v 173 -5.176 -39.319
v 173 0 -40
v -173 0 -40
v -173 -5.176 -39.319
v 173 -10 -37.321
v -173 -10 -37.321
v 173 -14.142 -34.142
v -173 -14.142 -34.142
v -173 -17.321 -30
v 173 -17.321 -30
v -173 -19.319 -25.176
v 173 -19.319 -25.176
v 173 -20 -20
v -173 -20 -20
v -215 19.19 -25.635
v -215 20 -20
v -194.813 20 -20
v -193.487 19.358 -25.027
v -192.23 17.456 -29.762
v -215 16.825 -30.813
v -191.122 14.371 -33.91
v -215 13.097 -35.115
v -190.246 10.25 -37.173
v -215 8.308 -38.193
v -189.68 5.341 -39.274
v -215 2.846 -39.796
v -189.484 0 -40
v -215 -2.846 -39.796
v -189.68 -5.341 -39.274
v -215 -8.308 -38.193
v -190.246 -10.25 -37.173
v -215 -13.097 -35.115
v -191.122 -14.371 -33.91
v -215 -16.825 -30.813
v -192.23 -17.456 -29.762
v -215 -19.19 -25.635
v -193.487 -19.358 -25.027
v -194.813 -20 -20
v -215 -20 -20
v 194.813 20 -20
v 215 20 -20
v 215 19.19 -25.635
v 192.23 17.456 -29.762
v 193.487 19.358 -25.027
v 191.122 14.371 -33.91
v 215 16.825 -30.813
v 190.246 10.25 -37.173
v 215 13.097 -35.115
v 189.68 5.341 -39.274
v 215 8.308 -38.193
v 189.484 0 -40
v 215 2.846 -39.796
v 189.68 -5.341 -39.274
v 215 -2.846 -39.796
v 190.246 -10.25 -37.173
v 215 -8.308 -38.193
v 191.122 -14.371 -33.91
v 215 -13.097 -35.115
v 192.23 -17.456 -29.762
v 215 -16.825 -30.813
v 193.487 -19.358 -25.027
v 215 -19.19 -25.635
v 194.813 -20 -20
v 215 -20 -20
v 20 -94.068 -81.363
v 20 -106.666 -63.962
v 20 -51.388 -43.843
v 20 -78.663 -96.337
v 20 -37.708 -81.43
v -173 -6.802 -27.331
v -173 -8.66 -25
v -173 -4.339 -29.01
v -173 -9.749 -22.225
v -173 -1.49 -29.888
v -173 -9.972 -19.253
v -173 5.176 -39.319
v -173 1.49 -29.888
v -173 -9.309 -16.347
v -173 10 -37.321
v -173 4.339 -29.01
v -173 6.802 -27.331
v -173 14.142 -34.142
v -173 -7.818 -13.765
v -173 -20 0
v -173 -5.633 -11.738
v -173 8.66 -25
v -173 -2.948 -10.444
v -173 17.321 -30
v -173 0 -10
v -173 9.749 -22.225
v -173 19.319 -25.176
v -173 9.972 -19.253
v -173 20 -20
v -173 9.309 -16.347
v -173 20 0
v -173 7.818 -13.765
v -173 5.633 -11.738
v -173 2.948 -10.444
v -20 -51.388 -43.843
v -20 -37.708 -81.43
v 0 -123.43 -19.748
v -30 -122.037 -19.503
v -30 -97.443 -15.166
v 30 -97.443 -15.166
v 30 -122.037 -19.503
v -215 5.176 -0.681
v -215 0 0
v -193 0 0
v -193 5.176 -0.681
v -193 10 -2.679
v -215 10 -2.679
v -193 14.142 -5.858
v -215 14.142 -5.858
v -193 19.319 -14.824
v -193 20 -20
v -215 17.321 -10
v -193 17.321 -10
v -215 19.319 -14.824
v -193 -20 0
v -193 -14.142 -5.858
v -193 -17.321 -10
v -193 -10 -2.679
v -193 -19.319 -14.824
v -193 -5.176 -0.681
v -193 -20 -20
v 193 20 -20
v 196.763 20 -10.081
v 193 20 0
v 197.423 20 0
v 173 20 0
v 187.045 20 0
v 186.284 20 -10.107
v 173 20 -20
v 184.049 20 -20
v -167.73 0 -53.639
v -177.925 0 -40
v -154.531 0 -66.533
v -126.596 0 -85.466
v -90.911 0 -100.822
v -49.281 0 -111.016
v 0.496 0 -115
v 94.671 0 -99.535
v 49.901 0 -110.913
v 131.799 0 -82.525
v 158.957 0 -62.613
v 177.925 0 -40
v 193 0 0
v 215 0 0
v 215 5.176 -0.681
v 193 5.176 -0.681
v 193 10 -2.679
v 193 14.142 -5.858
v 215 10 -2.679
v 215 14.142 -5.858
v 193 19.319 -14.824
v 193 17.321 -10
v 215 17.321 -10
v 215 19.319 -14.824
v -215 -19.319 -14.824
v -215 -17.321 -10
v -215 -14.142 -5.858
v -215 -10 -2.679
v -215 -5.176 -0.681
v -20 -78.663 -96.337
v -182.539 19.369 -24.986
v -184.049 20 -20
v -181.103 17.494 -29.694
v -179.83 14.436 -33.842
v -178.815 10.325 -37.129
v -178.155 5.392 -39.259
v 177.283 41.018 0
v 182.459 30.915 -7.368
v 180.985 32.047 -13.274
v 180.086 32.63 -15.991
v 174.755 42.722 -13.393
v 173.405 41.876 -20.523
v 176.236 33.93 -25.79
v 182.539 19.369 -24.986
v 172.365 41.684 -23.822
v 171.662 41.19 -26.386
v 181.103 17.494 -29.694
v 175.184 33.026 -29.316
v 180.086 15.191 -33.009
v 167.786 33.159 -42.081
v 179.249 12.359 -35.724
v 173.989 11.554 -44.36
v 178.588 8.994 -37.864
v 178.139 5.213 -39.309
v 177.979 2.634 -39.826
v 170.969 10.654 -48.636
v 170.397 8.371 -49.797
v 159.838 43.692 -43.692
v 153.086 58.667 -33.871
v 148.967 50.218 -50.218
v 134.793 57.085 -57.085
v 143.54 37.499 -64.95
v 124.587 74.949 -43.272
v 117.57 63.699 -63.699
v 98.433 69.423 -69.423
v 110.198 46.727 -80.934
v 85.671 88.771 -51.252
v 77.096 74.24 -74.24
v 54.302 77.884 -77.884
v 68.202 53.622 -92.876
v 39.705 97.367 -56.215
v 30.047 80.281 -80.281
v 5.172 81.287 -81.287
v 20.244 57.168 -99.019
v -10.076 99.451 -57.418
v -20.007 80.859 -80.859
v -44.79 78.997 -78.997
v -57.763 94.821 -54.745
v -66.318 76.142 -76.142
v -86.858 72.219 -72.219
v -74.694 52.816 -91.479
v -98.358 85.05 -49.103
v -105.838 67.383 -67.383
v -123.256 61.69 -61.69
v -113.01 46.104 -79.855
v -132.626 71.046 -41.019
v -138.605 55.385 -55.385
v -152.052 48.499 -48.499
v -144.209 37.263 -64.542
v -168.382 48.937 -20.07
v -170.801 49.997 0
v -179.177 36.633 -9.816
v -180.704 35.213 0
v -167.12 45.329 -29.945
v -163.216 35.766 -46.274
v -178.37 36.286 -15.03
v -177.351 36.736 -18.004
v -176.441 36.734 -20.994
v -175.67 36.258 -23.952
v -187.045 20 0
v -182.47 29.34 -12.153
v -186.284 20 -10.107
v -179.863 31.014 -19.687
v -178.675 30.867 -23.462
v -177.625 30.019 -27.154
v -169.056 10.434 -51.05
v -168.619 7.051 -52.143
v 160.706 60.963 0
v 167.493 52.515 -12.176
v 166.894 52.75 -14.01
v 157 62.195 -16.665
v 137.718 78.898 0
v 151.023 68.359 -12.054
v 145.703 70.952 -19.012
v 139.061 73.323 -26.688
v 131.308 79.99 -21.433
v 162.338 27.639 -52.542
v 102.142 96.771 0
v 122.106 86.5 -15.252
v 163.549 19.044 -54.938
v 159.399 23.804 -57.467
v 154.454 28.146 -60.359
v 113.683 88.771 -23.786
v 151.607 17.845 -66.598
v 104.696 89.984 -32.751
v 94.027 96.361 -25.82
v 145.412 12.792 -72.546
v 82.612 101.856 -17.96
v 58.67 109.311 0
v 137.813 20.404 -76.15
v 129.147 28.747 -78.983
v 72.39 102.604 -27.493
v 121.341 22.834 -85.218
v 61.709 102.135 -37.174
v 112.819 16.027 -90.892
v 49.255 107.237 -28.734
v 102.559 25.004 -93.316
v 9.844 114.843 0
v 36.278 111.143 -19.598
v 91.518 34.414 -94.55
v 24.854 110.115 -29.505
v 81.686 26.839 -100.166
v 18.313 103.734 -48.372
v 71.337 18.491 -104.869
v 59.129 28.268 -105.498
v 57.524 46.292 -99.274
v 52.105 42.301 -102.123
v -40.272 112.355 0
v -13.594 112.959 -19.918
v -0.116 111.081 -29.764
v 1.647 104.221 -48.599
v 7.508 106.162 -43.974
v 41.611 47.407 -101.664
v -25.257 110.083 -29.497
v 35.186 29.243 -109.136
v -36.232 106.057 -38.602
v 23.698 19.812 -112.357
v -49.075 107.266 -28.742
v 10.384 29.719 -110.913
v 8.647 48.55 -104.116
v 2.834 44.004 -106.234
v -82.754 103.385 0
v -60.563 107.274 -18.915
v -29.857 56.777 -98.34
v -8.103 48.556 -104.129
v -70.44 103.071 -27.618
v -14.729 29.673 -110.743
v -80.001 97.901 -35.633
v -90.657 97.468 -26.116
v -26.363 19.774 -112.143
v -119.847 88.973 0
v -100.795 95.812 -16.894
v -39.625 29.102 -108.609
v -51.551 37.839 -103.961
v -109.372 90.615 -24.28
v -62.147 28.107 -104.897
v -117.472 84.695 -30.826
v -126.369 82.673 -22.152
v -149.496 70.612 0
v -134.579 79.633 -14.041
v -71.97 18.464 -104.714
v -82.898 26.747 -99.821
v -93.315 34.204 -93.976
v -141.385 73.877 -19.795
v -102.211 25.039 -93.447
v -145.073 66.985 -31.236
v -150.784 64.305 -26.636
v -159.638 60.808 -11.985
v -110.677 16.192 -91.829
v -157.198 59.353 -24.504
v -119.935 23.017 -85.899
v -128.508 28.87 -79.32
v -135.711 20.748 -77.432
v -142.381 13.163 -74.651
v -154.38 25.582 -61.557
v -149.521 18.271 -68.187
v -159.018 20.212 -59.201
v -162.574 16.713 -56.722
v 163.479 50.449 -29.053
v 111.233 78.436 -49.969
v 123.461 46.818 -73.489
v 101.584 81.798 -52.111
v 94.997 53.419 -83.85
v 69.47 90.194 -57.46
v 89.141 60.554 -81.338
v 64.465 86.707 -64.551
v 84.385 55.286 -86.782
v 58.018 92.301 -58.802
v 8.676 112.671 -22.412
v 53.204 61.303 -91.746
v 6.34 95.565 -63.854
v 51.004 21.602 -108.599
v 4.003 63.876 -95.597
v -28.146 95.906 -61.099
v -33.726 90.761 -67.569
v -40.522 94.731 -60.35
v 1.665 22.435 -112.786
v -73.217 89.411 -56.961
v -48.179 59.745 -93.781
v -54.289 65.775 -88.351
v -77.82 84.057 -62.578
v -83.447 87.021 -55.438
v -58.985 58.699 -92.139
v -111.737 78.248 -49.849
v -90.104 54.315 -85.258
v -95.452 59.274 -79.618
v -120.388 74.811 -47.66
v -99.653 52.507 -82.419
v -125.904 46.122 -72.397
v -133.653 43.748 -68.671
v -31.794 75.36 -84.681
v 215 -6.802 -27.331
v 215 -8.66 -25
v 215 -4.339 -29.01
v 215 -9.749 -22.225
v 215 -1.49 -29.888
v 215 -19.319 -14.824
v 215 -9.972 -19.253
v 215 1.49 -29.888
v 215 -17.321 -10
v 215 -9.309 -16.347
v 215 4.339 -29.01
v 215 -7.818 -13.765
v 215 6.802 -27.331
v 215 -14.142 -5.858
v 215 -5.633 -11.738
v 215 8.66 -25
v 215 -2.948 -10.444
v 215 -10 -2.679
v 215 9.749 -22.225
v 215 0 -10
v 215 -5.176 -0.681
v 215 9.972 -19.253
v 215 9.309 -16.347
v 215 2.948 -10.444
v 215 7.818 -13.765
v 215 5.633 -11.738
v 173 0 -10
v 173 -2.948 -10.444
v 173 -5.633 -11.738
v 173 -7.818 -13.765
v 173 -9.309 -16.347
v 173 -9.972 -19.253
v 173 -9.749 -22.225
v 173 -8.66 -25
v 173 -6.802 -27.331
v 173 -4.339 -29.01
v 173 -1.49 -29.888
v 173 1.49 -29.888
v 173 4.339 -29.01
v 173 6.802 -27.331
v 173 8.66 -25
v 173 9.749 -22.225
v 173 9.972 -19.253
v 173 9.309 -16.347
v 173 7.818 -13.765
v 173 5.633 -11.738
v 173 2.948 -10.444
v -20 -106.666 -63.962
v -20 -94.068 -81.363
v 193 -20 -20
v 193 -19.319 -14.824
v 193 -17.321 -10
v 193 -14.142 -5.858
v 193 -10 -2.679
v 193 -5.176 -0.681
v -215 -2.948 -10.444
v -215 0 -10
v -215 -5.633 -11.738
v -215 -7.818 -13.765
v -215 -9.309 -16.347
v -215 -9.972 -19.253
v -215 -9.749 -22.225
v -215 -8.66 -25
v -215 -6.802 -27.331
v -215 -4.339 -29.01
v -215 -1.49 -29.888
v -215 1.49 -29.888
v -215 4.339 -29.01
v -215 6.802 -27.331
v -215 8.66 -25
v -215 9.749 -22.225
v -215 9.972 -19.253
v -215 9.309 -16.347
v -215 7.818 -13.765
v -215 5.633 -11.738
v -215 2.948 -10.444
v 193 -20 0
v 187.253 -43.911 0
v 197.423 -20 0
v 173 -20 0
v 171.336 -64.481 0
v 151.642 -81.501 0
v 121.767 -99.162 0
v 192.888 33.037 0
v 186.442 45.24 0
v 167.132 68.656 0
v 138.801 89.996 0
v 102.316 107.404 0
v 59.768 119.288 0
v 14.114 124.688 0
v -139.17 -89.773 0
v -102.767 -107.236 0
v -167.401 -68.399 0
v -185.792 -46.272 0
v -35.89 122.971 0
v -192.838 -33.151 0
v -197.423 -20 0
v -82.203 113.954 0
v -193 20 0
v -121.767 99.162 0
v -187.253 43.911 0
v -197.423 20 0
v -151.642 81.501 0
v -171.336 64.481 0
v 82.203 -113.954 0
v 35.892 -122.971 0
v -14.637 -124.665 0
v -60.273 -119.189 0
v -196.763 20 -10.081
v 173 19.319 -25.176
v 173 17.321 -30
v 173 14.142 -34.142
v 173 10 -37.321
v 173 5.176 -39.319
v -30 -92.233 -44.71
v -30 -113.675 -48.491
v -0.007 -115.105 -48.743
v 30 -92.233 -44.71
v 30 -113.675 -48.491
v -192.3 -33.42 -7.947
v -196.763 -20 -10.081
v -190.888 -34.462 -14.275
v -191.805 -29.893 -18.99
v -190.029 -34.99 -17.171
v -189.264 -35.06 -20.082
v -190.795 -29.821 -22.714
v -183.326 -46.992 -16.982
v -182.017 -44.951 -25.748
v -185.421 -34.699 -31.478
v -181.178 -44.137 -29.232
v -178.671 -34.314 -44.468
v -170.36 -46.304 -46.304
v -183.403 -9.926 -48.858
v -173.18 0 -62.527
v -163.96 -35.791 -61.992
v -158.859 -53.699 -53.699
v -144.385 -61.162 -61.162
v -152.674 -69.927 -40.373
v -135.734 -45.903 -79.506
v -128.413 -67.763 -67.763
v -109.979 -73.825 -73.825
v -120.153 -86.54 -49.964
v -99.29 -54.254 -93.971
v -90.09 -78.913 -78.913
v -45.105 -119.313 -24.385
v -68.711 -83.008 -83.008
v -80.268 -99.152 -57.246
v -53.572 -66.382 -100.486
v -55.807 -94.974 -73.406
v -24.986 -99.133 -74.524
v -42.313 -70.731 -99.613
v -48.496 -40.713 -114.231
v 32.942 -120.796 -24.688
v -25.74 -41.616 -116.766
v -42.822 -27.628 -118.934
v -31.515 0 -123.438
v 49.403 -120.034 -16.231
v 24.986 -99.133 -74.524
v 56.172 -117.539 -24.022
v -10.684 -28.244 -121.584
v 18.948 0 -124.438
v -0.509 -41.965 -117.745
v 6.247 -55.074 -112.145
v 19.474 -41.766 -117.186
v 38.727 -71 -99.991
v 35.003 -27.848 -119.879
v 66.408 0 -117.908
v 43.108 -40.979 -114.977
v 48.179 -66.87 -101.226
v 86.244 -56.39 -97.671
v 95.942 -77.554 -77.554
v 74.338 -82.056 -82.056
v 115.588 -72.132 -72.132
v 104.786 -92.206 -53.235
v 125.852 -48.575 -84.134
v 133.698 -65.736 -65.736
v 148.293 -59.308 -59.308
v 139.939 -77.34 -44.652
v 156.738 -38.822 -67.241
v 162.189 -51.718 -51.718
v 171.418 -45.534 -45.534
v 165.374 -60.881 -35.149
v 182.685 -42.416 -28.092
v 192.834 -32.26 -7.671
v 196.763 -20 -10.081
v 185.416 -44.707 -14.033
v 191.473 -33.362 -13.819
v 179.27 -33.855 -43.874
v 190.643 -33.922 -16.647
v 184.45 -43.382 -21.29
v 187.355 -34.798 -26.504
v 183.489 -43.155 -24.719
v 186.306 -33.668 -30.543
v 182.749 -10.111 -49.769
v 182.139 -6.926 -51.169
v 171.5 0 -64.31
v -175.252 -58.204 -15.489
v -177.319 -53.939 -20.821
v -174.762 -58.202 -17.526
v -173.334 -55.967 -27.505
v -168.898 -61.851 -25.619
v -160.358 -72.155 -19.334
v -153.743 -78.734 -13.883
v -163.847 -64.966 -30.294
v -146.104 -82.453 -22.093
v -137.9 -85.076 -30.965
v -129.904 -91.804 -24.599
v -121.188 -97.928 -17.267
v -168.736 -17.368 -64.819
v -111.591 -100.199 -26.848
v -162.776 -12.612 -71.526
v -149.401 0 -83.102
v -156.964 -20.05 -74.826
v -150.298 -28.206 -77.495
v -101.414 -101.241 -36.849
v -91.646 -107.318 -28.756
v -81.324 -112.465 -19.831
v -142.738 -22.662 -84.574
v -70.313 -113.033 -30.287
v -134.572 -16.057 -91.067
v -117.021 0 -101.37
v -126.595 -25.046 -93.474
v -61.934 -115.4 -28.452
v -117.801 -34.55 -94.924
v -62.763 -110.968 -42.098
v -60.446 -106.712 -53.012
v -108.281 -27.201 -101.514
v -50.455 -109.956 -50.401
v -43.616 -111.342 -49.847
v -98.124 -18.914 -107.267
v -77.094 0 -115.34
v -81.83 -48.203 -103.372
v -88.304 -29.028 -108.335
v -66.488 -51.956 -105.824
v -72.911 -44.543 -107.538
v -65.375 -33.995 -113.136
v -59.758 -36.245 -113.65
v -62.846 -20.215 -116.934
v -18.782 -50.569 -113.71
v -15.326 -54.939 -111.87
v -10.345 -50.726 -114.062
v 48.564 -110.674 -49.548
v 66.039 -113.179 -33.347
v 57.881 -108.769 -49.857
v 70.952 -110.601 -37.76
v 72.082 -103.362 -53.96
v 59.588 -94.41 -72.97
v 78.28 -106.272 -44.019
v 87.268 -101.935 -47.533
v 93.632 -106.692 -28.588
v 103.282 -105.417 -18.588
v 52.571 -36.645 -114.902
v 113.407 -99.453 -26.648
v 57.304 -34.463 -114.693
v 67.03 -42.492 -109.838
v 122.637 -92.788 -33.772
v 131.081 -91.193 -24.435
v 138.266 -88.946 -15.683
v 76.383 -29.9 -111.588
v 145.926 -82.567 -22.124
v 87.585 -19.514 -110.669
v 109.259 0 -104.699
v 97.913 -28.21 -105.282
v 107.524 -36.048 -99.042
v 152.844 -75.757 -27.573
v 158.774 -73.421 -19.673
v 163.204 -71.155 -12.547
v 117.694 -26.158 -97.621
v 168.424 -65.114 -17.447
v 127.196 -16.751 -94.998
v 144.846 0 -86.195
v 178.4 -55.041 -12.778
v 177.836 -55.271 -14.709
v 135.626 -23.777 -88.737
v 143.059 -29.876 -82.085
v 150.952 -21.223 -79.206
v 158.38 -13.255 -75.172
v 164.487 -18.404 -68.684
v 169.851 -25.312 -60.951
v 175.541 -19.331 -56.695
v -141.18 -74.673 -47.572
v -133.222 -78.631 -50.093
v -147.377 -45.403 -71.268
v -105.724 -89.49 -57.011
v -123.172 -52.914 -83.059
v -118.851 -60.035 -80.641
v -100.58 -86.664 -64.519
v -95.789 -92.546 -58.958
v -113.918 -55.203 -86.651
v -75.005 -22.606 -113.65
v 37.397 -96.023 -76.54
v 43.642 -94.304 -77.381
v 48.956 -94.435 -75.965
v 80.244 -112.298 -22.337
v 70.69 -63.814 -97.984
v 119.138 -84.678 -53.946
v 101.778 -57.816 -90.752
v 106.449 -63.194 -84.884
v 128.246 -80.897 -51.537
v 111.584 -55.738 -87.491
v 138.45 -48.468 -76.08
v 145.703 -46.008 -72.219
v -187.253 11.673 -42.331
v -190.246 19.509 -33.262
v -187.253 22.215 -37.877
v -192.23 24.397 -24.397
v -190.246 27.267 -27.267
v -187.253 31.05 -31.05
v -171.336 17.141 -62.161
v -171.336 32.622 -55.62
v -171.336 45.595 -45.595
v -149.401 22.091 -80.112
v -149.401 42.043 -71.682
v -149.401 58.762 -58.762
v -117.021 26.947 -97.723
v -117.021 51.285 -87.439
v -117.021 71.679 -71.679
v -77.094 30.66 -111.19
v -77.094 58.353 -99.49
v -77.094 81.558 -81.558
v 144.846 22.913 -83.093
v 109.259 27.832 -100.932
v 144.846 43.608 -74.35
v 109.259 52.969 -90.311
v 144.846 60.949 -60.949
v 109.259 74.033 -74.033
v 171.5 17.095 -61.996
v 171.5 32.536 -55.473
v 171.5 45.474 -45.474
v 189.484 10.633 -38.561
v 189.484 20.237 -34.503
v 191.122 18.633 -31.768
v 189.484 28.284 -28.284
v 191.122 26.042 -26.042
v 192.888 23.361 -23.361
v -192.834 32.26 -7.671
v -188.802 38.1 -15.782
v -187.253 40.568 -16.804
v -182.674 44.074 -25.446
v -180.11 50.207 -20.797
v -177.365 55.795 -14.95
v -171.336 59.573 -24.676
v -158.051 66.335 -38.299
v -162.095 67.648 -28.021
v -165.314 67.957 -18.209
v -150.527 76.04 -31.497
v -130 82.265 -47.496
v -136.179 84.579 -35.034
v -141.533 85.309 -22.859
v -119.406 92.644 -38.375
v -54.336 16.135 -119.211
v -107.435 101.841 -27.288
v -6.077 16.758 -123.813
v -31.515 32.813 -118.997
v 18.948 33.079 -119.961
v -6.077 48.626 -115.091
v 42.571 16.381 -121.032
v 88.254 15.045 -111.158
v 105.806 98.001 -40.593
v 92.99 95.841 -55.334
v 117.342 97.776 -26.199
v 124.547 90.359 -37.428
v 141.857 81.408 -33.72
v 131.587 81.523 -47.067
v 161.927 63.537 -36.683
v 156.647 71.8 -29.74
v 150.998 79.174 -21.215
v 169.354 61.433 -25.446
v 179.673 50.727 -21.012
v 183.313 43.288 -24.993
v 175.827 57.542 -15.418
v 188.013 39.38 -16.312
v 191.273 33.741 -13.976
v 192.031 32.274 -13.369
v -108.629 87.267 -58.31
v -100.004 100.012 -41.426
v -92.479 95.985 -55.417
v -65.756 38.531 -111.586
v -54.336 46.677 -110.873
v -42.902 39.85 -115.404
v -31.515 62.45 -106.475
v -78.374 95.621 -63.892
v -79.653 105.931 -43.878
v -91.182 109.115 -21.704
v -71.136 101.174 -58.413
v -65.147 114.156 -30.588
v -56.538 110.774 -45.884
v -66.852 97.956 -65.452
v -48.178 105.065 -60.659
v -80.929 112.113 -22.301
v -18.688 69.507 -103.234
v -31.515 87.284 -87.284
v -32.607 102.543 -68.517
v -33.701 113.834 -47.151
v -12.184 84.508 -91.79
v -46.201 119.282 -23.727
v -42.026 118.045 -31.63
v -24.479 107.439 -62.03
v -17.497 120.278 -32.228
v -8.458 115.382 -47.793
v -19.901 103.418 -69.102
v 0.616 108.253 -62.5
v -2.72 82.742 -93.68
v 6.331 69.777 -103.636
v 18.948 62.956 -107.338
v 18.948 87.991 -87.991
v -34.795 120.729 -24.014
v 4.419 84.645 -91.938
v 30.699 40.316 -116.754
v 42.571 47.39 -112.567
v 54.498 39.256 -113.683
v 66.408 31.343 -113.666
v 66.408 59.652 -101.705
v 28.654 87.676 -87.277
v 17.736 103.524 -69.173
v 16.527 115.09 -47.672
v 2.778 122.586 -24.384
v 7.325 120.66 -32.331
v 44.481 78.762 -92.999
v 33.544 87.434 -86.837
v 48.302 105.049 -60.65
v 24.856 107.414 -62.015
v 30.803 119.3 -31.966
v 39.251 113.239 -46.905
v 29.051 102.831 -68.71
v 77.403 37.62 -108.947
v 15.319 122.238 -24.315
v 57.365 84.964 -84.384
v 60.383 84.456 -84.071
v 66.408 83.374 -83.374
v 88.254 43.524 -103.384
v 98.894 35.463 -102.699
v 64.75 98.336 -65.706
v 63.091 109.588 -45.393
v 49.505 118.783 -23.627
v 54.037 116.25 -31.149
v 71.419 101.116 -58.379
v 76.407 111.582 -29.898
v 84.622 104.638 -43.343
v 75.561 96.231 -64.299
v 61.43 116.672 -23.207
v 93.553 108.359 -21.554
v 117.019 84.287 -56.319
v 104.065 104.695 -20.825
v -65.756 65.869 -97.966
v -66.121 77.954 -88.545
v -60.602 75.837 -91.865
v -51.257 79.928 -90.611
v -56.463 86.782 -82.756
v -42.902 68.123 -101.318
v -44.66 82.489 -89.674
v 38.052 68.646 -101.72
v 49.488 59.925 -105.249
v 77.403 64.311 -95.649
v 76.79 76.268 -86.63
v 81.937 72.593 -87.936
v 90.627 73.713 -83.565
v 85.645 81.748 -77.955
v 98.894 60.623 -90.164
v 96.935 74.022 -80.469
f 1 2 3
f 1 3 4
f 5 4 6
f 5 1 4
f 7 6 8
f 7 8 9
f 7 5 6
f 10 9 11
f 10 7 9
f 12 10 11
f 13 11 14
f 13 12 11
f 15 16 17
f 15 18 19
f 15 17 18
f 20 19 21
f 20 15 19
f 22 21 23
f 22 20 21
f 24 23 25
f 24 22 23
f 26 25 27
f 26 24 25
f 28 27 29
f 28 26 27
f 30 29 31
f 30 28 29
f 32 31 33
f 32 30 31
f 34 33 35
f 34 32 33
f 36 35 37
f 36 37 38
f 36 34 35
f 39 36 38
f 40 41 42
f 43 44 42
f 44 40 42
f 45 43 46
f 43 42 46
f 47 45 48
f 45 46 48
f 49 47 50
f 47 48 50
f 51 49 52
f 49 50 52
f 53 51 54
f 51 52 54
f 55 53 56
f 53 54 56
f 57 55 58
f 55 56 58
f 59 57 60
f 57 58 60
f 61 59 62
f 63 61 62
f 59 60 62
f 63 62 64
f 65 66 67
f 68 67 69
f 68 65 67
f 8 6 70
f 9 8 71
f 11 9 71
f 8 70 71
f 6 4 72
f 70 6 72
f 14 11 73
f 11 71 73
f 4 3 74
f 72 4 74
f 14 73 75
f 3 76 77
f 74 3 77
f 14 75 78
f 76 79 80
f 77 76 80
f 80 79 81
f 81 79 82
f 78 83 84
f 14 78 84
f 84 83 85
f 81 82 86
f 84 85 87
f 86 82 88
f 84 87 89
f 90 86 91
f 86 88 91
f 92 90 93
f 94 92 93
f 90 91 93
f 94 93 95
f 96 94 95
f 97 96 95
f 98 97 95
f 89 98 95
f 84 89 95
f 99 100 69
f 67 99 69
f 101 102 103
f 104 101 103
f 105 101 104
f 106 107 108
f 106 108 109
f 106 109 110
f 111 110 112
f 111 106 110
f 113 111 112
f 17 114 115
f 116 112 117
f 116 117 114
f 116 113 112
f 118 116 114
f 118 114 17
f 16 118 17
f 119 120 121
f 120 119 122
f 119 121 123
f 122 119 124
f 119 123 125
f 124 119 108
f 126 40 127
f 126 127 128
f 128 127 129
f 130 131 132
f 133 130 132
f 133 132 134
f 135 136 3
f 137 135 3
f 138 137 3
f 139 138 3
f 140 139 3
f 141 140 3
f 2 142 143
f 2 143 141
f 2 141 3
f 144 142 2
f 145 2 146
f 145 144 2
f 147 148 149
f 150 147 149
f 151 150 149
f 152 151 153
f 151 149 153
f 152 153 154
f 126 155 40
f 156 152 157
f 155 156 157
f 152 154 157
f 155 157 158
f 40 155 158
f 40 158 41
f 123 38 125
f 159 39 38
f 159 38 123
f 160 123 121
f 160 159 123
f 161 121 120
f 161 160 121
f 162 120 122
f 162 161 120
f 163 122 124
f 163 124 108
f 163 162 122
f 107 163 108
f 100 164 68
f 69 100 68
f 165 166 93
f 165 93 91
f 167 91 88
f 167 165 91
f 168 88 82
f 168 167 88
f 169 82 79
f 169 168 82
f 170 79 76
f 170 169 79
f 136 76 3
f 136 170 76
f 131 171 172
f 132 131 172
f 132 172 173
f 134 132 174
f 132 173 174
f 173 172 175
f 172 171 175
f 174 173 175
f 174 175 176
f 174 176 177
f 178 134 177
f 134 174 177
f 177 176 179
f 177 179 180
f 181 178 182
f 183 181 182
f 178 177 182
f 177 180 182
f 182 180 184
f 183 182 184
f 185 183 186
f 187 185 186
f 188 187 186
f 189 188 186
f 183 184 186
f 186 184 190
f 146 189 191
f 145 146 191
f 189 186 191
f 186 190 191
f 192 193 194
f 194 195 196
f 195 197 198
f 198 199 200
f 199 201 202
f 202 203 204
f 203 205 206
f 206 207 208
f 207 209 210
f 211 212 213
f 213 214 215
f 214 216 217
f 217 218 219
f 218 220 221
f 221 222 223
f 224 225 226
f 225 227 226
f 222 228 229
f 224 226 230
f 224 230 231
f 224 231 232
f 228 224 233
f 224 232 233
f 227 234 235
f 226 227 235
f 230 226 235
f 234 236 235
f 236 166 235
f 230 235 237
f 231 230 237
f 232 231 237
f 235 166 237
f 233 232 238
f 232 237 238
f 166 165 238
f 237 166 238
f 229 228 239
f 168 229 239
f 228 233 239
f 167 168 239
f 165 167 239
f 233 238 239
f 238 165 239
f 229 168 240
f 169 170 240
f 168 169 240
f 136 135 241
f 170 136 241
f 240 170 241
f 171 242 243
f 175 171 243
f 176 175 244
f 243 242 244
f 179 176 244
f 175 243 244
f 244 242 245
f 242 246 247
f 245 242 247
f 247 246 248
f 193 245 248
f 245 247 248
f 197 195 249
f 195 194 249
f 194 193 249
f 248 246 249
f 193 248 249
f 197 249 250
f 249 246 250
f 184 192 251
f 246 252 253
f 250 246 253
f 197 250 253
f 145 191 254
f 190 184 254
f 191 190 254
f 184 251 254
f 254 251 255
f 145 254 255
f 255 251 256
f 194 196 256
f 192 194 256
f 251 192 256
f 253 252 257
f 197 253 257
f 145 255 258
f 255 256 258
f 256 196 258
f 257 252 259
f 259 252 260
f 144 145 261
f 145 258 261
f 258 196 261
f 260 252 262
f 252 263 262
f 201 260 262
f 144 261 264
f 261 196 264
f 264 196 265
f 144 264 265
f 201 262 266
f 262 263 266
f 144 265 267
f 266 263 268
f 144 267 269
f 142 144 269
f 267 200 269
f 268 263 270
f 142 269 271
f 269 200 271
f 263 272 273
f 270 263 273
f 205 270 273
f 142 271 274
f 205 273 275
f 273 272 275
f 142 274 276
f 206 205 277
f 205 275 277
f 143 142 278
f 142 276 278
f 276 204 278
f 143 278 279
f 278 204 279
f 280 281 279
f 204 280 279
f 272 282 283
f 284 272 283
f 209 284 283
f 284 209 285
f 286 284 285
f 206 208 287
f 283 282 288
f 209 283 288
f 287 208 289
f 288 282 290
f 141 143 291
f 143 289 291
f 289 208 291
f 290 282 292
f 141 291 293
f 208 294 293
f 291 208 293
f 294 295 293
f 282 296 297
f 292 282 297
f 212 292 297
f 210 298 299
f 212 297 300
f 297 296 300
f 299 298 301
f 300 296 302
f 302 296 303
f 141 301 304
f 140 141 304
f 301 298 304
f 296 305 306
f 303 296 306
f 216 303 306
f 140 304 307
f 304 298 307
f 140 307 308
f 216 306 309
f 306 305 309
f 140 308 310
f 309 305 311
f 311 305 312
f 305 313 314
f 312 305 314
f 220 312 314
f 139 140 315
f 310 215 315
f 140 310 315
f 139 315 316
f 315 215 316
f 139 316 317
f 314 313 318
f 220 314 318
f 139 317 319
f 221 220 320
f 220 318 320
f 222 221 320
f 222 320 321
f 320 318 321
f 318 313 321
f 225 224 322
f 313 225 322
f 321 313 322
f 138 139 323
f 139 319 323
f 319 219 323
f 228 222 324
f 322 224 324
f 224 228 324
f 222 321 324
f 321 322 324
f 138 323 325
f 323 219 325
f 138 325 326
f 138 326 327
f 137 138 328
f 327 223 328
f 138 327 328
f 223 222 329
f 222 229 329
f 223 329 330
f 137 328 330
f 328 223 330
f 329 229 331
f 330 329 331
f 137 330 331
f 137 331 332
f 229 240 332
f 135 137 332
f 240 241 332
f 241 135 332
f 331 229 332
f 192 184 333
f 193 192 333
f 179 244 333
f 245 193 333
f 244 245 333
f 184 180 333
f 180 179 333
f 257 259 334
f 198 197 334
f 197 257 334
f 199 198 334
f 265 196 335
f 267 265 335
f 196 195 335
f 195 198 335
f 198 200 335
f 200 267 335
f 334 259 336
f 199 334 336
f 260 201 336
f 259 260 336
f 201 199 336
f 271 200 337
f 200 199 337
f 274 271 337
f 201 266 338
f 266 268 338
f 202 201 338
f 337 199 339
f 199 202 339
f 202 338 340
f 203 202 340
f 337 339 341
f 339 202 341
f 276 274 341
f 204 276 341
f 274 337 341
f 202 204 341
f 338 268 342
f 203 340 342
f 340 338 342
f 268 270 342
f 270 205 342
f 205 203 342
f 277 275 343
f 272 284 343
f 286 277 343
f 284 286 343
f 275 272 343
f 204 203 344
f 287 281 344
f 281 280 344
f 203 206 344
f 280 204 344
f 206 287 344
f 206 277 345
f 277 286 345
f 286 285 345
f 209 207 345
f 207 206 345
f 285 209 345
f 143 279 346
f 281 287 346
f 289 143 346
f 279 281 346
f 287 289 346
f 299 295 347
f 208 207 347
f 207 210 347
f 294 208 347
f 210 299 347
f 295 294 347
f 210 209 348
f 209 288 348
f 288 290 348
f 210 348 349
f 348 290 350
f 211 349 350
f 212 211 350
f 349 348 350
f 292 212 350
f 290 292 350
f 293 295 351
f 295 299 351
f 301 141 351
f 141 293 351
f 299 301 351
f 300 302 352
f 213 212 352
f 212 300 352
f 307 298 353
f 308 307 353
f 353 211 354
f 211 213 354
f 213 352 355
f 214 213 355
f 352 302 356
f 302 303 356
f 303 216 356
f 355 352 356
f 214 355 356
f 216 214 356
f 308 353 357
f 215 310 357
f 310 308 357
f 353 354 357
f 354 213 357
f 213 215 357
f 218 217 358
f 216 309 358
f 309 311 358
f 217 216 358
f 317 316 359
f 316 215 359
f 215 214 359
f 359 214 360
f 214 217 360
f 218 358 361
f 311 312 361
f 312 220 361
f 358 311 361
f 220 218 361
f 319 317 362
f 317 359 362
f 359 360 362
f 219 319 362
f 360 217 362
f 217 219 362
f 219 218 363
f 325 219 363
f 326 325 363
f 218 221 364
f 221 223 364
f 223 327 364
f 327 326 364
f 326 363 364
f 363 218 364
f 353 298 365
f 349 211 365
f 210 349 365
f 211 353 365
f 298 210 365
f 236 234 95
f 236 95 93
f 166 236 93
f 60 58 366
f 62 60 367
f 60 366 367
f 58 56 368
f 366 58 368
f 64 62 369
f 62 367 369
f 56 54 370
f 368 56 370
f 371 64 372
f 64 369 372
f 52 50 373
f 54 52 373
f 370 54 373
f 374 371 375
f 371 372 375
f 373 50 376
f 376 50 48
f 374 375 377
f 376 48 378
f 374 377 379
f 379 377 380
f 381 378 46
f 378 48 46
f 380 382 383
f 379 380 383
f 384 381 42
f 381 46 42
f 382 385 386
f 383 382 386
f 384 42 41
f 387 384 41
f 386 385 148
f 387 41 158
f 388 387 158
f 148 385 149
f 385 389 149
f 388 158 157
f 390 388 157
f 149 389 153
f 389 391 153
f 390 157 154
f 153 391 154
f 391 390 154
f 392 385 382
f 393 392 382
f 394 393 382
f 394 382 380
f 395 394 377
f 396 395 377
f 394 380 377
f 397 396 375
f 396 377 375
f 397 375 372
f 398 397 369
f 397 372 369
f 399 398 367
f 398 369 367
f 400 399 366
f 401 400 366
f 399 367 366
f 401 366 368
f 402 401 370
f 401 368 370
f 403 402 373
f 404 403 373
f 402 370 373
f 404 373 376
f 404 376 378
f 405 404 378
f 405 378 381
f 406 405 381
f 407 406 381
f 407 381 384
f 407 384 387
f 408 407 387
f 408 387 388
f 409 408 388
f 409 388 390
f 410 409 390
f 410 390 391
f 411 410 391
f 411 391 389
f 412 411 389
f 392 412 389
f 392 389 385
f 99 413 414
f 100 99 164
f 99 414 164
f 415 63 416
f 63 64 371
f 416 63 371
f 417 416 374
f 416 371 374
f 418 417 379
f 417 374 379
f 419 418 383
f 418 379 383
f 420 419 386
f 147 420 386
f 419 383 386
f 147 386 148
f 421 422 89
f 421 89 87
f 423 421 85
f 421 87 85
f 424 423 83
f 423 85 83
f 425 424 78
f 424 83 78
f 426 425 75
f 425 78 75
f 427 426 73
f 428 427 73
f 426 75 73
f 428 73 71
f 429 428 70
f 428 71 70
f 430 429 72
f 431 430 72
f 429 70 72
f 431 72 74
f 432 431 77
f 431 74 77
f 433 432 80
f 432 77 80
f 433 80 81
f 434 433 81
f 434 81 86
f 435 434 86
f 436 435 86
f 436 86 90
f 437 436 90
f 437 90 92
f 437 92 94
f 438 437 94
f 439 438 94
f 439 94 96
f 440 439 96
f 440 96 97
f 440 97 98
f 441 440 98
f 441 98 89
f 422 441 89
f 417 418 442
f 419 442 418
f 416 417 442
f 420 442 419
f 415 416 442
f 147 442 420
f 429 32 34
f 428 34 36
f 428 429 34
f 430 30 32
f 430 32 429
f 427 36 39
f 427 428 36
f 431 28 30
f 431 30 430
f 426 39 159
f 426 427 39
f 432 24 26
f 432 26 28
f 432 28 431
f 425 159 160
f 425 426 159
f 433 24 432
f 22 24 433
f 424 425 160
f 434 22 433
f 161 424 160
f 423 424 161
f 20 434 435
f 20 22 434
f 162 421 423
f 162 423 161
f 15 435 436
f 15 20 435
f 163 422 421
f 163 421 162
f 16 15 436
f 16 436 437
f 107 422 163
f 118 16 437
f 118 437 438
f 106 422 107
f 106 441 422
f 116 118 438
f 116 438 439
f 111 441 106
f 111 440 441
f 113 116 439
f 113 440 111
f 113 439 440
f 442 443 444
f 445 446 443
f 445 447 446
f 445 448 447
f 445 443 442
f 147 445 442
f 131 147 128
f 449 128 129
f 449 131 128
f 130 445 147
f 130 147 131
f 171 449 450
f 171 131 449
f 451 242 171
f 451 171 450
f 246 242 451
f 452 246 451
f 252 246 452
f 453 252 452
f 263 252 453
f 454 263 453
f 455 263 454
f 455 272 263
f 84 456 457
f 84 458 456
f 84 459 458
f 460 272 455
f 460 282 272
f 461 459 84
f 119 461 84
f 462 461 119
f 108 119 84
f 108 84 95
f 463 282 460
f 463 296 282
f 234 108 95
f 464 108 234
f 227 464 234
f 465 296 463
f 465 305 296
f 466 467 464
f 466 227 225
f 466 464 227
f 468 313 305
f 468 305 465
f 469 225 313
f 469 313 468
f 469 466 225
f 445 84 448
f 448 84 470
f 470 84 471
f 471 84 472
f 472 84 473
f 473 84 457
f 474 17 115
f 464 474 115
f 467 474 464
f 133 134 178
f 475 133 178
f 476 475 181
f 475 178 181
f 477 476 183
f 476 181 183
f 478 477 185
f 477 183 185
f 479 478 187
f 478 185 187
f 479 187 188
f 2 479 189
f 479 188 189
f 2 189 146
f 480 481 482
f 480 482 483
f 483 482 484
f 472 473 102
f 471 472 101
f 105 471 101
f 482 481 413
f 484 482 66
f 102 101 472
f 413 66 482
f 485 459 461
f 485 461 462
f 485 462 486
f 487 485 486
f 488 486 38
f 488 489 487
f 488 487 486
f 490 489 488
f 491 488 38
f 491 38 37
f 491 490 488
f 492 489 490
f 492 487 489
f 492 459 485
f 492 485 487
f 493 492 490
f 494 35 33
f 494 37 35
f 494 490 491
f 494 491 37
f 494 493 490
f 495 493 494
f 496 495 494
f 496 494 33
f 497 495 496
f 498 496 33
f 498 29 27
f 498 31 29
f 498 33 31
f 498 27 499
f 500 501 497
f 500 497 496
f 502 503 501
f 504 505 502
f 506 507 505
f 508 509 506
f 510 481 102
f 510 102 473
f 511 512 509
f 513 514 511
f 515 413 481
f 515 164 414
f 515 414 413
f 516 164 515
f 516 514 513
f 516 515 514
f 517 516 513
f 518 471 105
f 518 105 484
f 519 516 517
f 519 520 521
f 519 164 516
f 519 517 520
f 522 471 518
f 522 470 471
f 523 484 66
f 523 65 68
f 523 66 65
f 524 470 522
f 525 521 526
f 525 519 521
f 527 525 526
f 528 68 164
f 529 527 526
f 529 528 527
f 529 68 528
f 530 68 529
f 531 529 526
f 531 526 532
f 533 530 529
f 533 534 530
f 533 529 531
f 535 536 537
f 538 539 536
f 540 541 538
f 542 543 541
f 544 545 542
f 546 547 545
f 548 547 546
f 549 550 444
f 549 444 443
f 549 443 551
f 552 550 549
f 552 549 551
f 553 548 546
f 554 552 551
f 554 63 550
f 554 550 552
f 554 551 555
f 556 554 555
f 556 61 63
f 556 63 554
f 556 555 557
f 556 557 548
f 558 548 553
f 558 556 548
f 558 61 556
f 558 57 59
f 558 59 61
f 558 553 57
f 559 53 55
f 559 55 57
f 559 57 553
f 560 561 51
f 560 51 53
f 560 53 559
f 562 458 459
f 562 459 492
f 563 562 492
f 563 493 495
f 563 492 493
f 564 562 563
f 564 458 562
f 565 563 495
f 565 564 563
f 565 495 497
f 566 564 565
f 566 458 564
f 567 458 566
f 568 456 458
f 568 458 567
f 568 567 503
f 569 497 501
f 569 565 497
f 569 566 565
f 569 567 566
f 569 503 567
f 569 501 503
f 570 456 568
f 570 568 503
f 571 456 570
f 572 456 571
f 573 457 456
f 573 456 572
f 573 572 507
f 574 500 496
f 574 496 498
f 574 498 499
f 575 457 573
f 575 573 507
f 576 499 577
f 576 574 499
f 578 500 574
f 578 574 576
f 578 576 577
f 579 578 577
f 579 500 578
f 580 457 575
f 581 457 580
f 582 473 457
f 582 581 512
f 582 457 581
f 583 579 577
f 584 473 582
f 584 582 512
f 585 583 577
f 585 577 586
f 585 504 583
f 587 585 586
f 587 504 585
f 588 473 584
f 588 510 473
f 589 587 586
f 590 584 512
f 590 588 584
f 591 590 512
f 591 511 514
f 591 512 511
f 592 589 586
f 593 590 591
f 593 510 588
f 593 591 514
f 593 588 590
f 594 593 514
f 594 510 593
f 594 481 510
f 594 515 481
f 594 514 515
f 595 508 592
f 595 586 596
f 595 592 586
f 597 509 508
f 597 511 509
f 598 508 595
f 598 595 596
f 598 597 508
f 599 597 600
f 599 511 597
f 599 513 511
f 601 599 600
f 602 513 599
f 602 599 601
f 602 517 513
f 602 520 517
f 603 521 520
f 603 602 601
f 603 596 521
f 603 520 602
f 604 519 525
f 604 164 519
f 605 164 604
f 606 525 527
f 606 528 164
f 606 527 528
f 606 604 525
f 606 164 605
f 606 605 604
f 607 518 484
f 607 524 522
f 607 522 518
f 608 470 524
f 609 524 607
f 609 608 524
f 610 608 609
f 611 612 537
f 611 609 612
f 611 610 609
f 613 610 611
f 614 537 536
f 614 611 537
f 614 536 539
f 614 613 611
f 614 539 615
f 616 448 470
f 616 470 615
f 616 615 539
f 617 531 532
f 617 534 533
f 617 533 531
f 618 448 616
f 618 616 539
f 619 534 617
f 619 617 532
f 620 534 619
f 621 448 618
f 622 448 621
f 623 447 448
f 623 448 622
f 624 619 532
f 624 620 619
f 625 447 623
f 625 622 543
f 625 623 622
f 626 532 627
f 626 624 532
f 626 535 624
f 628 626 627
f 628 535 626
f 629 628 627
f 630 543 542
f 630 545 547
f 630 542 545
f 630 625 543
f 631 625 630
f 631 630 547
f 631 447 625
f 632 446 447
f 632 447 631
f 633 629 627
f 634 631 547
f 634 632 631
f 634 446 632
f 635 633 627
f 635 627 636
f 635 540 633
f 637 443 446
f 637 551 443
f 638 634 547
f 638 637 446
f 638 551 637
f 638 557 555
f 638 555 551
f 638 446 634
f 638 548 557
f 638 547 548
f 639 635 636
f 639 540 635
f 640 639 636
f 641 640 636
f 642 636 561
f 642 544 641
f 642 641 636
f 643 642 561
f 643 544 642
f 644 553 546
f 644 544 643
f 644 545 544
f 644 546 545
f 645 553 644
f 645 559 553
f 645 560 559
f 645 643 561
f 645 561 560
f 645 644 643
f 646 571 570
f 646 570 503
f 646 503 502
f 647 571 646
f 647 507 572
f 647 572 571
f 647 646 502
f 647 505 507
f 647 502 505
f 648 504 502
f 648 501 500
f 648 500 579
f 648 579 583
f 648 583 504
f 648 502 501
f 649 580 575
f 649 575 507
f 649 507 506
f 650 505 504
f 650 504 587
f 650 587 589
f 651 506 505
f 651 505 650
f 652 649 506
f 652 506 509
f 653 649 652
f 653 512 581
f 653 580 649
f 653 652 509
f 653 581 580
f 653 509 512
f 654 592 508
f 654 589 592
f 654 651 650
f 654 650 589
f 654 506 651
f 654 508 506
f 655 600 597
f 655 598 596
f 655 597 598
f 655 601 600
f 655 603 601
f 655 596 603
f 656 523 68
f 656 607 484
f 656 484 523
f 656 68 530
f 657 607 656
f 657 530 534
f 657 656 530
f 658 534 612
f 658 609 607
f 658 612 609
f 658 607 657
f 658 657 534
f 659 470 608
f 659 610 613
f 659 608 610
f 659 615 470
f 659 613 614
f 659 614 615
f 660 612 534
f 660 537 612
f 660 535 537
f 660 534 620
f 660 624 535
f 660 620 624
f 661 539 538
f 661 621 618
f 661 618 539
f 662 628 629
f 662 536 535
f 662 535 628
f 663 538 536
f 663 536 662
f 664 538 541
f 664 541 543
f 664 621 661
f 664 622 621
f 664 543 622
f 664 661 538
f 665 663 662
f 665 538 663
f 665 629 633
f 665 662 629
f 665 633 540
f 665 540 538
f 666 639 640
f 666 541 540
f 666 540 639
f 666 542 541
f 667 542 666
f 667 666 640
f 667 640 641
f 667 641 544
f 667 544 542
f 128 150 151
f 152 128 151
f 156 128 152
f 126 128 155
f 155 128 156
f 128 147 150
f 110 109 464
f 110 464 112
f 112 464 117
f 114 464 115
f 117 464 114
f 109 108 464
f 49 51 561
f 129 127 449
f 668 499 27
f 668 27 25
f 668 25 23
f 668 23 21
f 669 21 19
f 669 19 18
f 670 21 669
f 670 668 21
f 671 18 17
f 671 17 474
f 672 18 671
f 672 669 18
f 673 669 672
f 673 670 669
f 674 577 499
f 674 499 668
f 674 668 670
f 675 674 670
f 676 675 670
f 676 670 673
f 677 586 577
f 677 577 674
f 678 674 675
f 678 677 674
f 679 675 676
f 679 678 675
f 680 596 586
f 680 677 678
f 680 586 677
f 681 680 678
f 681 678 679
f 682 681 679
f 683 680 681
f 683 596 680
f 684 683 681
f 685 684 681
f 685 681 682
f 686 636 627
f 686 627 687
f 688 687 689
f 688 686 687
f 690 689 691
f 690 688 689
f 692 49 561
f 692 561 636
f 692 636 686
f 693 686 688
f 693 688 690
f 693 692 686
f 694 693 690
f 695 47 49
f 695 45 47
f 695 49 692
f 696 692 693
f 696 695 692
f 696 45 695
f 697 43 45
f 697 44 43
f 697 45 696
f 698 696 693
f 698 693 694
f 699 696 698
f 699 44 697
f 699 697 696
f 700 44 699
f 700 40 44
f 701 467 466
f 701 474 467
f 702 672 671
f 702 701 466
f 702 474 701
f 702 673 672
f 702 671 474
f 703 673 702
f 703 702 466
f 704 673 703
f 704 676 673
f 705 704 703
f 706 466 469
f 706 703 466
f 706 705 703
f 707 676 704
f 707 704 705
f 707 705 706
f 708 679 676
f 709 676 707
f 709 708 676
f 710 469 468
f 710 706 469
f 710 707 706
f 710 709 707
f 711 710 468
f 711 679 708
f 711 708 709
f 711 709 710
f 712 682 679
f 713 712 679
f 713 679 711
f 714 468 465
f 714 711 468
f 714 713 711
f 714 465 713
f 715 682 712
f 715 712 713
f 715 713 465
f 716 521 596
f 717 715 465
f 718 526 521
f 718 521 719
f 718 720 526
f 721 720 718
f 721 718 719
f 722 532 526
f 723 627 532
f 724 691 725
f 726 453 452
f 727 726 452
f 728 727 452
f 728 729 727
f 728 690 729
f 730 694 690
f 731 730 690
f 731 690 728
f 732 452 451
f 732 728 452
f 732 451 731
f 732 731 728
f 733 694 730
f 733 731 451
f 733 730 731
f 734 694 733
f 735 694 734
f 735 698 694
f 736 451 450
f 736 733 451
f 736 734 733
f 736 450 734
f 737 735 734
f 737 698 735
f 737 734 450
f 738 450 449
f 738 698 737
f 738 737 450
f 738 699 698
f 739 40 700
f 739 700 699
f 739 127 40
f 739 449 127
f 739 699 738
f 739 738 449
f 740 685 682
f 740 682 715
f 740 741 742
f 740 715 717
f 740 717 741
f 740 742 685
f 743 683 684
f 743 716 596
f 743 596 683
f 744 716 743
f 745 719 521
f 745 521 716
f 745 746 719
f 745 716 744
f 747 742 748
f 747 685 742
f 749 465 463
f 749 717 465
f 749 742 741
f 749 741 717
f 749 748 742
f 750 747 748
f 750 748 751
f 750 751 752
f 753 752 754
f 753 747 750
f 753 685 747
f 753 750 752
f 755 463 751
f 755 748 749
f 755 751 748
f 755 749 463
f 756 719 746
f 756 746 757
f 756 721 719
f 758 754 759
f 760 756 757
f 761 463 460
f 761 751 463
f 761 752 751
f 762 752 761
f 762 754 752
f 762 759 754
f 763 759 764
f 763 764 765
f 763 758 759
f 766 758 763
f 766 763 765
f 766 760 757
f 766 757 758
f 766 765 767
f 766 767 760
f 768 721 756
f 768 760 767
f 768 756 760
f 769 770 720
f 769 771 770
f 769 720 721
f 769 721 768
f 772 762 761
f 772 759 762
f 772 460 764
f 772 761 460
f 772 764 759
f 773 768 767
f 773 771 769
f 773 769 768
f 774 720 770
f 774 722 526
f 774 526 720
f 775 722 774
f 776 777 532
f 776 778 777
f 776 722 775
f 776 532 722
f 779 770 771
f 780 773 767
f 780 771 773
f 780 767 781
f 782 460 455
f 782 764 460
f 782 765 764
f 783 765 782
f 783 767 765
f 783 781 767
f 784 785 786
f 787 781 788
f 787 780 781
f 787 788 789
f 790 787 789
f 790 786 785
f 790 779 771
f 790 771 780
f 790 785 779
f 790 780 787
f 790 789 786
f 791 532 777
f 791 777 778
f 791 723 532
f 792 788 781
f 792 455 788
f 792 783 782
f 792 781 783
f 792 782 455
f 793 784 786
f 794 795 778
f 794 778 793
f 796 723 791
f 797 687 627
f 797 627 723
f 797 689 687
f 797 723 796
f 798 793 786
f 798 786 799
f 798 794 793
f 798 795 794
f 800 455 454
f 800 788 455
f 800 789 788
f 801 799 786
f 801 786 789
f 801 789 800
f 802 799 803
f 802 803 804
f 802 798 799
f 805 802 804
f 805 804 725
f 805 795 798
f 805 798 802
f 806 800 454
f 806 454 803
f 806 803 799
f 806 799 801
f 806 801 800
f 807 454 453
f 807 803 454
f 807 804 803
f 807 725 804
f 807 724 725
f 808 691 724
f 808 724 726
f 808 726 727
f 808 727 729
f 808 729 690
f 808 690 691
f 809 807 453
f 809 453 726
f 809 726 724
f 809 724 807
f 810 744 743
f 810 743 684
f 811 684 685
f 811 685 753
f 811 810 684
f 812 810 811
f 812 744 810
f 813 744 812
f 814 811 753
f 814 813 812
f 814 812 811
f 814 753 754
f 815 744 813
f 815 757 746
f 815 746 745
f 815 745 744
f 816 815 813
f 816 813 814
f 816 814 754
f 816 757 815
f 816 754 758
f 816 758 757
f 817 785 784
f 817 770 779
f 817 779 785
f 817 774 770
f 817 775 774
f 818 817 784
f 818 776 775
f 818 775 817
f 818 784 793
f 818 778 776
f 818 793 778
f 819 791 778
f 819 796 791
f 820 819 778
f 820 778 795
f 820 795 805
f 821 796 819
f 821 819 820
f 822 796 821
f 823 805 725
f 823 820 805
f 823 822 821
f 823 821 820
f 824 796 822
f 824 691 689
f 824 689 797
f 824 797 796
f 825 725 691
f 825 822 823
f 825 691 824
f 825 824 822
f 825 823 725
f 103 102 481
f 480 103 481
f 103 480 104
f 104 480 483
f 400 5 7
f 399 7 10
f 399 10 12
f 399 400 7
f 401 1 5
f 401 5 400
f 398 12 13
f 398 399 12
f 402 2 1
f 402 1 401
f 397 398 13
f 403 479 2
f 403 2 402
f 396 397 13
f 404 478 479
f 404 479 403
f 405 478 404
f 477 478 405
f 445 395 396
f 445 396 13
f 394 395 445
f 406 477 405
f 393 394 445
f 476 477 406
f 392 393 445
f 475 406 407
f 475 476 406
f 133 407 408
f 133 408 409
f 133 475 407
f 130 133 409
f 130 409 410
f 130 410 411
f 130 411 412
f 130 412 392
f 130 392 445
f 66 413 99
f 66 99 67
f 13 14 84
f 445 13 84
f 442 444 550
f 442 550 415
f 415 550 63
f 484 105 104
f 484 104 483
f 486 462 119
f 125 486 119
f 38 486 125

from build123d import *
from build123d.topology import SkipClean

# Parameters (mm, degrees)
SKETCH_3_W          = 40
SKETCH_3_H          = 40
CUT_EXTRUDE_1_DEPTH = 70
CUT_REVOLVE_1_ANGLE = 90
CUT_EXTRUDE_2_DEPTH = 452.082032598
EXTRUDE_1_DEPTH     = 42
SKETCH_7_R          = 10
CUT_EXTRUDE_3_DEPTH = 440
CUT_EXTRUDE_4_DEPTH = 22
SKETCH_9_W          = 60
SKETCH_9_H          = 30
CUT_EXTRUDE_5_DEPTH = 30


with BuildPart() as part:
    # 草图1 → 旋转3 (revolve)
    with SkipClean():  # the faces are left unmerged after this step: merging them gives an invalid solid
        with BuildSketch(Plane(origin=(0, 0, 0), x_dir=(1, 0, 0), z_dir=(0, 1, 0))):
            with BuildLine():
                add(Edge.make_bspline(
                    [(200, 0), (200, 125), (0, 125), (-200, 125), (-200, 0)],
                    knots=[0, 0, 0, 1.570796327, 1.570796327, 3.141592654, 3.141592654, 3.141592654], degree=2, weights=[1, 0.707106781, 1, 0.707106781, 1]))
                Line((-200, 0), (200, 0))
            make_face()
            with BuildLine():
                Line((200, 0), (-200, 0))
                add(Edge.make_bspline(
                    [(-200, 0), (-200, -125), (0, -125), (200, -125), (200, 0)],
                    knots=[3.141592654, 3.141592654, 3.141592654, 4.71238898, 4.71238898, 6.283185307, 6.283185307, 6.283185307], degree=2, weights=[1, 0.707106781, 1, 0.707106781, 1]))
            make_face()
        revolve(axis=Axis((-376.776806715, 0, 0), (1, 0, 0)))
    add(part.part.scale(1), mode=Mode.REPLACE)  # the faces are merged on a copy

    # Surface Cut 1
    split(bisect_by=Plane.XY, keep=Keep.BOTTOM)

    # 草图3 → 切除-拉伸1 (cut)
    with BuildSketch(Plane(origin=(0, -125.246294878, -45.585923288), x_dir=(1, 0, 0), z_dir=(0, 0.9396926207859081, 0.34202014332566943))):
        with Locations((0, 43.622733675)):
            Rectangle(SKETCH_3_W, SKETCH_3_H)
    extrude(amount=CUT_EXTRUDE_1_DEPTH, mode=Mode.SUBTRACT)

    # 草图4 → 切除-旋转1 (revolve, cut)
    with BuildSketch(Plane.XY):
        with BuildLine():
            Line((-189.264857791, 10), (189.264857791, 10))
            add(Edge.make_bspline(
                [(189.264857791, 10), (189.01661408, 11.685645813), (188.399842232, 15.02459428), (186.660672029, 21.717695752), (183.544014825, 30.028723701), (178.280438028, 39.871100011), (169.238112825, 52.698753606), (154.190025082, 67.938441209), (130.617285564, 84.133702491), (102.331625356, 97.503941795), (70.346299789, 107.469826997), (35.819572857, 113.615740598), (0, 115.692129701), (-35.819572857, 113.615740598), (-70.346299789, 107.469826997), (-102.331625356, 97.503941795), (-130.617285564, 84.133702491), (-154.190025082, 67.938441209), (-169.238112825, 52.698753606), (-178.280438028, 39.871100011), (-183.544014825, 30.028723701), (-186.660672029, 21.717695752), (-188.399842232, 15.02459428), (-189.01661408, 11.685645813), (-189.264857791, 10)],
                knots=[0.091784635, 0.091784635, 0.091784635, 0.091784635, 0.13800375, 0.184222866, 0.276661096, 0.369099327, 0.461537558, 0.646414019, 0.831290481, 1.016166942, 1.201043404, 1.385919865, 1.570796327, 1.755672788, 1.94054925, 2.125425711, 2.310302173, 2.495178634, 2.680055096, 2.772493326, 2.864931557, 2.957369788, 3.003588903, 3.049808019, 3.049808019, 3.049808019, 3.049808019], degree=3))
        make_face()
    revolve(axis=Axis((-200, 0, 0), (-1, 0, 0)), revolution_arc=CUT_REVOLVE_1_ANGLE, mode=Mode.SUBTRACT)

    # 草图5 → 切除-拉伸2 (cut, through all)
    with BuildSketch(Plane(origin=(215, 0, 0), x_dir=(0, 0, -1), z_dir=(1, 0, 0))):
        with BuildLine():
            ThreePointArc((20, 20), (40, 0), (20, -20))
            Line((20, -20), (0, -20))
            Line((0, -20), (0, 20))
            Line((0, 20), (20, 20))
        make_face()
    extrude(amount=-CUT_EXTRUDE_2_DEPTH, mode=Mode.SUBTRACT)

    # 草图6 → 凸台-拉伸1 (add)
    with BuildSketch(Plane(origin=(215, 0, 0), x_dir=(0, 0, -1), z_dir=(1, 0, 0))):
        with BuildLine():
            Line((20, -20), (0, -20))
            Line((0, -20), (0, 20))
            Line((0, 20), (20, 20))
            ThreePointArc((20, 20), (40, 0), (20, -20))
        make_face()
    extrude_1 = extrude(amount=-EXTRUDE_1_DEPTH)

    # 镜向1: 凸台-拉伸1 across plane
    add(extrude_1.mirror(Plane(origin=(0, 0, 0), x_dir=(0, 0, 1), z_dir=(1, 0, 0))))

    # 草图7 → 切除-拉伸3 (cut)
    with BuildSketch(Plane(origin=(215, 0, 0), x_dir=(0, 0, -1), z_dir=(1, 0, 0))):
        with Locations(Location((20, 0, 0), (0, 0, 180))):
            Circle(SKETCH_7_R)
    extrude(amount=-CUT_EXTRUDE_3_DEPTH, mode=Mode.SUBTRACT)

    # 草图8 → 切除-拉伸4 (cut)
    with BuildSketch(Plane(origin=(215, 0, 0), x_dir=(0, 0, -1), z_dir=(1, 0, 0))):
        with BuildLine():
            ThreePointArc((0, 4.7e-08), (5.857864393, 14.14213564), (20, 20))
            Line((20, 20), (0, 20))
            Line((0, 20), (0, 4.7e-08))
        make_face()
        with BuildLine():
            ThreePointArc((20, -20), (5.85786436, -14.142135607), (0, 4.7e-08))
            Line((0, 4.7e-08), (0, -20))
            Line((0, -20), (20, -20))
        make_face()
    cut_extrude_4 = extrude(amount=-CUT_EXTRUDE_4_DEPTH, mode=Mode.SUBTRACT)

    # 镜向2: 切除-拉伸4 across plane
    add(cut_extrude_4.mirror(Plane(origin=(0, 0, 0), x_dir=(0, 0, 1), z_dir=(1, 0, 0))), mode=Mode.SUBTRACT)

    # 草图9 → 切除-拉伸5 (cut)
    with BuildSketch(Plane(origin=(0, -126.642161547, -22.330429976), x_dir=(1, 0, 0), z_dir=(0, 0.984807753012208, 0.17364817766693072))):
        with Locations((0, 13.014685424)):
            Rectangle(SKETCH_9_W, SKETCH_9_H)
    extrude(amount=CUT_EXTRUDE_5_DEPTH, mode=Mode.SUBTRACT)


solid = part.part
